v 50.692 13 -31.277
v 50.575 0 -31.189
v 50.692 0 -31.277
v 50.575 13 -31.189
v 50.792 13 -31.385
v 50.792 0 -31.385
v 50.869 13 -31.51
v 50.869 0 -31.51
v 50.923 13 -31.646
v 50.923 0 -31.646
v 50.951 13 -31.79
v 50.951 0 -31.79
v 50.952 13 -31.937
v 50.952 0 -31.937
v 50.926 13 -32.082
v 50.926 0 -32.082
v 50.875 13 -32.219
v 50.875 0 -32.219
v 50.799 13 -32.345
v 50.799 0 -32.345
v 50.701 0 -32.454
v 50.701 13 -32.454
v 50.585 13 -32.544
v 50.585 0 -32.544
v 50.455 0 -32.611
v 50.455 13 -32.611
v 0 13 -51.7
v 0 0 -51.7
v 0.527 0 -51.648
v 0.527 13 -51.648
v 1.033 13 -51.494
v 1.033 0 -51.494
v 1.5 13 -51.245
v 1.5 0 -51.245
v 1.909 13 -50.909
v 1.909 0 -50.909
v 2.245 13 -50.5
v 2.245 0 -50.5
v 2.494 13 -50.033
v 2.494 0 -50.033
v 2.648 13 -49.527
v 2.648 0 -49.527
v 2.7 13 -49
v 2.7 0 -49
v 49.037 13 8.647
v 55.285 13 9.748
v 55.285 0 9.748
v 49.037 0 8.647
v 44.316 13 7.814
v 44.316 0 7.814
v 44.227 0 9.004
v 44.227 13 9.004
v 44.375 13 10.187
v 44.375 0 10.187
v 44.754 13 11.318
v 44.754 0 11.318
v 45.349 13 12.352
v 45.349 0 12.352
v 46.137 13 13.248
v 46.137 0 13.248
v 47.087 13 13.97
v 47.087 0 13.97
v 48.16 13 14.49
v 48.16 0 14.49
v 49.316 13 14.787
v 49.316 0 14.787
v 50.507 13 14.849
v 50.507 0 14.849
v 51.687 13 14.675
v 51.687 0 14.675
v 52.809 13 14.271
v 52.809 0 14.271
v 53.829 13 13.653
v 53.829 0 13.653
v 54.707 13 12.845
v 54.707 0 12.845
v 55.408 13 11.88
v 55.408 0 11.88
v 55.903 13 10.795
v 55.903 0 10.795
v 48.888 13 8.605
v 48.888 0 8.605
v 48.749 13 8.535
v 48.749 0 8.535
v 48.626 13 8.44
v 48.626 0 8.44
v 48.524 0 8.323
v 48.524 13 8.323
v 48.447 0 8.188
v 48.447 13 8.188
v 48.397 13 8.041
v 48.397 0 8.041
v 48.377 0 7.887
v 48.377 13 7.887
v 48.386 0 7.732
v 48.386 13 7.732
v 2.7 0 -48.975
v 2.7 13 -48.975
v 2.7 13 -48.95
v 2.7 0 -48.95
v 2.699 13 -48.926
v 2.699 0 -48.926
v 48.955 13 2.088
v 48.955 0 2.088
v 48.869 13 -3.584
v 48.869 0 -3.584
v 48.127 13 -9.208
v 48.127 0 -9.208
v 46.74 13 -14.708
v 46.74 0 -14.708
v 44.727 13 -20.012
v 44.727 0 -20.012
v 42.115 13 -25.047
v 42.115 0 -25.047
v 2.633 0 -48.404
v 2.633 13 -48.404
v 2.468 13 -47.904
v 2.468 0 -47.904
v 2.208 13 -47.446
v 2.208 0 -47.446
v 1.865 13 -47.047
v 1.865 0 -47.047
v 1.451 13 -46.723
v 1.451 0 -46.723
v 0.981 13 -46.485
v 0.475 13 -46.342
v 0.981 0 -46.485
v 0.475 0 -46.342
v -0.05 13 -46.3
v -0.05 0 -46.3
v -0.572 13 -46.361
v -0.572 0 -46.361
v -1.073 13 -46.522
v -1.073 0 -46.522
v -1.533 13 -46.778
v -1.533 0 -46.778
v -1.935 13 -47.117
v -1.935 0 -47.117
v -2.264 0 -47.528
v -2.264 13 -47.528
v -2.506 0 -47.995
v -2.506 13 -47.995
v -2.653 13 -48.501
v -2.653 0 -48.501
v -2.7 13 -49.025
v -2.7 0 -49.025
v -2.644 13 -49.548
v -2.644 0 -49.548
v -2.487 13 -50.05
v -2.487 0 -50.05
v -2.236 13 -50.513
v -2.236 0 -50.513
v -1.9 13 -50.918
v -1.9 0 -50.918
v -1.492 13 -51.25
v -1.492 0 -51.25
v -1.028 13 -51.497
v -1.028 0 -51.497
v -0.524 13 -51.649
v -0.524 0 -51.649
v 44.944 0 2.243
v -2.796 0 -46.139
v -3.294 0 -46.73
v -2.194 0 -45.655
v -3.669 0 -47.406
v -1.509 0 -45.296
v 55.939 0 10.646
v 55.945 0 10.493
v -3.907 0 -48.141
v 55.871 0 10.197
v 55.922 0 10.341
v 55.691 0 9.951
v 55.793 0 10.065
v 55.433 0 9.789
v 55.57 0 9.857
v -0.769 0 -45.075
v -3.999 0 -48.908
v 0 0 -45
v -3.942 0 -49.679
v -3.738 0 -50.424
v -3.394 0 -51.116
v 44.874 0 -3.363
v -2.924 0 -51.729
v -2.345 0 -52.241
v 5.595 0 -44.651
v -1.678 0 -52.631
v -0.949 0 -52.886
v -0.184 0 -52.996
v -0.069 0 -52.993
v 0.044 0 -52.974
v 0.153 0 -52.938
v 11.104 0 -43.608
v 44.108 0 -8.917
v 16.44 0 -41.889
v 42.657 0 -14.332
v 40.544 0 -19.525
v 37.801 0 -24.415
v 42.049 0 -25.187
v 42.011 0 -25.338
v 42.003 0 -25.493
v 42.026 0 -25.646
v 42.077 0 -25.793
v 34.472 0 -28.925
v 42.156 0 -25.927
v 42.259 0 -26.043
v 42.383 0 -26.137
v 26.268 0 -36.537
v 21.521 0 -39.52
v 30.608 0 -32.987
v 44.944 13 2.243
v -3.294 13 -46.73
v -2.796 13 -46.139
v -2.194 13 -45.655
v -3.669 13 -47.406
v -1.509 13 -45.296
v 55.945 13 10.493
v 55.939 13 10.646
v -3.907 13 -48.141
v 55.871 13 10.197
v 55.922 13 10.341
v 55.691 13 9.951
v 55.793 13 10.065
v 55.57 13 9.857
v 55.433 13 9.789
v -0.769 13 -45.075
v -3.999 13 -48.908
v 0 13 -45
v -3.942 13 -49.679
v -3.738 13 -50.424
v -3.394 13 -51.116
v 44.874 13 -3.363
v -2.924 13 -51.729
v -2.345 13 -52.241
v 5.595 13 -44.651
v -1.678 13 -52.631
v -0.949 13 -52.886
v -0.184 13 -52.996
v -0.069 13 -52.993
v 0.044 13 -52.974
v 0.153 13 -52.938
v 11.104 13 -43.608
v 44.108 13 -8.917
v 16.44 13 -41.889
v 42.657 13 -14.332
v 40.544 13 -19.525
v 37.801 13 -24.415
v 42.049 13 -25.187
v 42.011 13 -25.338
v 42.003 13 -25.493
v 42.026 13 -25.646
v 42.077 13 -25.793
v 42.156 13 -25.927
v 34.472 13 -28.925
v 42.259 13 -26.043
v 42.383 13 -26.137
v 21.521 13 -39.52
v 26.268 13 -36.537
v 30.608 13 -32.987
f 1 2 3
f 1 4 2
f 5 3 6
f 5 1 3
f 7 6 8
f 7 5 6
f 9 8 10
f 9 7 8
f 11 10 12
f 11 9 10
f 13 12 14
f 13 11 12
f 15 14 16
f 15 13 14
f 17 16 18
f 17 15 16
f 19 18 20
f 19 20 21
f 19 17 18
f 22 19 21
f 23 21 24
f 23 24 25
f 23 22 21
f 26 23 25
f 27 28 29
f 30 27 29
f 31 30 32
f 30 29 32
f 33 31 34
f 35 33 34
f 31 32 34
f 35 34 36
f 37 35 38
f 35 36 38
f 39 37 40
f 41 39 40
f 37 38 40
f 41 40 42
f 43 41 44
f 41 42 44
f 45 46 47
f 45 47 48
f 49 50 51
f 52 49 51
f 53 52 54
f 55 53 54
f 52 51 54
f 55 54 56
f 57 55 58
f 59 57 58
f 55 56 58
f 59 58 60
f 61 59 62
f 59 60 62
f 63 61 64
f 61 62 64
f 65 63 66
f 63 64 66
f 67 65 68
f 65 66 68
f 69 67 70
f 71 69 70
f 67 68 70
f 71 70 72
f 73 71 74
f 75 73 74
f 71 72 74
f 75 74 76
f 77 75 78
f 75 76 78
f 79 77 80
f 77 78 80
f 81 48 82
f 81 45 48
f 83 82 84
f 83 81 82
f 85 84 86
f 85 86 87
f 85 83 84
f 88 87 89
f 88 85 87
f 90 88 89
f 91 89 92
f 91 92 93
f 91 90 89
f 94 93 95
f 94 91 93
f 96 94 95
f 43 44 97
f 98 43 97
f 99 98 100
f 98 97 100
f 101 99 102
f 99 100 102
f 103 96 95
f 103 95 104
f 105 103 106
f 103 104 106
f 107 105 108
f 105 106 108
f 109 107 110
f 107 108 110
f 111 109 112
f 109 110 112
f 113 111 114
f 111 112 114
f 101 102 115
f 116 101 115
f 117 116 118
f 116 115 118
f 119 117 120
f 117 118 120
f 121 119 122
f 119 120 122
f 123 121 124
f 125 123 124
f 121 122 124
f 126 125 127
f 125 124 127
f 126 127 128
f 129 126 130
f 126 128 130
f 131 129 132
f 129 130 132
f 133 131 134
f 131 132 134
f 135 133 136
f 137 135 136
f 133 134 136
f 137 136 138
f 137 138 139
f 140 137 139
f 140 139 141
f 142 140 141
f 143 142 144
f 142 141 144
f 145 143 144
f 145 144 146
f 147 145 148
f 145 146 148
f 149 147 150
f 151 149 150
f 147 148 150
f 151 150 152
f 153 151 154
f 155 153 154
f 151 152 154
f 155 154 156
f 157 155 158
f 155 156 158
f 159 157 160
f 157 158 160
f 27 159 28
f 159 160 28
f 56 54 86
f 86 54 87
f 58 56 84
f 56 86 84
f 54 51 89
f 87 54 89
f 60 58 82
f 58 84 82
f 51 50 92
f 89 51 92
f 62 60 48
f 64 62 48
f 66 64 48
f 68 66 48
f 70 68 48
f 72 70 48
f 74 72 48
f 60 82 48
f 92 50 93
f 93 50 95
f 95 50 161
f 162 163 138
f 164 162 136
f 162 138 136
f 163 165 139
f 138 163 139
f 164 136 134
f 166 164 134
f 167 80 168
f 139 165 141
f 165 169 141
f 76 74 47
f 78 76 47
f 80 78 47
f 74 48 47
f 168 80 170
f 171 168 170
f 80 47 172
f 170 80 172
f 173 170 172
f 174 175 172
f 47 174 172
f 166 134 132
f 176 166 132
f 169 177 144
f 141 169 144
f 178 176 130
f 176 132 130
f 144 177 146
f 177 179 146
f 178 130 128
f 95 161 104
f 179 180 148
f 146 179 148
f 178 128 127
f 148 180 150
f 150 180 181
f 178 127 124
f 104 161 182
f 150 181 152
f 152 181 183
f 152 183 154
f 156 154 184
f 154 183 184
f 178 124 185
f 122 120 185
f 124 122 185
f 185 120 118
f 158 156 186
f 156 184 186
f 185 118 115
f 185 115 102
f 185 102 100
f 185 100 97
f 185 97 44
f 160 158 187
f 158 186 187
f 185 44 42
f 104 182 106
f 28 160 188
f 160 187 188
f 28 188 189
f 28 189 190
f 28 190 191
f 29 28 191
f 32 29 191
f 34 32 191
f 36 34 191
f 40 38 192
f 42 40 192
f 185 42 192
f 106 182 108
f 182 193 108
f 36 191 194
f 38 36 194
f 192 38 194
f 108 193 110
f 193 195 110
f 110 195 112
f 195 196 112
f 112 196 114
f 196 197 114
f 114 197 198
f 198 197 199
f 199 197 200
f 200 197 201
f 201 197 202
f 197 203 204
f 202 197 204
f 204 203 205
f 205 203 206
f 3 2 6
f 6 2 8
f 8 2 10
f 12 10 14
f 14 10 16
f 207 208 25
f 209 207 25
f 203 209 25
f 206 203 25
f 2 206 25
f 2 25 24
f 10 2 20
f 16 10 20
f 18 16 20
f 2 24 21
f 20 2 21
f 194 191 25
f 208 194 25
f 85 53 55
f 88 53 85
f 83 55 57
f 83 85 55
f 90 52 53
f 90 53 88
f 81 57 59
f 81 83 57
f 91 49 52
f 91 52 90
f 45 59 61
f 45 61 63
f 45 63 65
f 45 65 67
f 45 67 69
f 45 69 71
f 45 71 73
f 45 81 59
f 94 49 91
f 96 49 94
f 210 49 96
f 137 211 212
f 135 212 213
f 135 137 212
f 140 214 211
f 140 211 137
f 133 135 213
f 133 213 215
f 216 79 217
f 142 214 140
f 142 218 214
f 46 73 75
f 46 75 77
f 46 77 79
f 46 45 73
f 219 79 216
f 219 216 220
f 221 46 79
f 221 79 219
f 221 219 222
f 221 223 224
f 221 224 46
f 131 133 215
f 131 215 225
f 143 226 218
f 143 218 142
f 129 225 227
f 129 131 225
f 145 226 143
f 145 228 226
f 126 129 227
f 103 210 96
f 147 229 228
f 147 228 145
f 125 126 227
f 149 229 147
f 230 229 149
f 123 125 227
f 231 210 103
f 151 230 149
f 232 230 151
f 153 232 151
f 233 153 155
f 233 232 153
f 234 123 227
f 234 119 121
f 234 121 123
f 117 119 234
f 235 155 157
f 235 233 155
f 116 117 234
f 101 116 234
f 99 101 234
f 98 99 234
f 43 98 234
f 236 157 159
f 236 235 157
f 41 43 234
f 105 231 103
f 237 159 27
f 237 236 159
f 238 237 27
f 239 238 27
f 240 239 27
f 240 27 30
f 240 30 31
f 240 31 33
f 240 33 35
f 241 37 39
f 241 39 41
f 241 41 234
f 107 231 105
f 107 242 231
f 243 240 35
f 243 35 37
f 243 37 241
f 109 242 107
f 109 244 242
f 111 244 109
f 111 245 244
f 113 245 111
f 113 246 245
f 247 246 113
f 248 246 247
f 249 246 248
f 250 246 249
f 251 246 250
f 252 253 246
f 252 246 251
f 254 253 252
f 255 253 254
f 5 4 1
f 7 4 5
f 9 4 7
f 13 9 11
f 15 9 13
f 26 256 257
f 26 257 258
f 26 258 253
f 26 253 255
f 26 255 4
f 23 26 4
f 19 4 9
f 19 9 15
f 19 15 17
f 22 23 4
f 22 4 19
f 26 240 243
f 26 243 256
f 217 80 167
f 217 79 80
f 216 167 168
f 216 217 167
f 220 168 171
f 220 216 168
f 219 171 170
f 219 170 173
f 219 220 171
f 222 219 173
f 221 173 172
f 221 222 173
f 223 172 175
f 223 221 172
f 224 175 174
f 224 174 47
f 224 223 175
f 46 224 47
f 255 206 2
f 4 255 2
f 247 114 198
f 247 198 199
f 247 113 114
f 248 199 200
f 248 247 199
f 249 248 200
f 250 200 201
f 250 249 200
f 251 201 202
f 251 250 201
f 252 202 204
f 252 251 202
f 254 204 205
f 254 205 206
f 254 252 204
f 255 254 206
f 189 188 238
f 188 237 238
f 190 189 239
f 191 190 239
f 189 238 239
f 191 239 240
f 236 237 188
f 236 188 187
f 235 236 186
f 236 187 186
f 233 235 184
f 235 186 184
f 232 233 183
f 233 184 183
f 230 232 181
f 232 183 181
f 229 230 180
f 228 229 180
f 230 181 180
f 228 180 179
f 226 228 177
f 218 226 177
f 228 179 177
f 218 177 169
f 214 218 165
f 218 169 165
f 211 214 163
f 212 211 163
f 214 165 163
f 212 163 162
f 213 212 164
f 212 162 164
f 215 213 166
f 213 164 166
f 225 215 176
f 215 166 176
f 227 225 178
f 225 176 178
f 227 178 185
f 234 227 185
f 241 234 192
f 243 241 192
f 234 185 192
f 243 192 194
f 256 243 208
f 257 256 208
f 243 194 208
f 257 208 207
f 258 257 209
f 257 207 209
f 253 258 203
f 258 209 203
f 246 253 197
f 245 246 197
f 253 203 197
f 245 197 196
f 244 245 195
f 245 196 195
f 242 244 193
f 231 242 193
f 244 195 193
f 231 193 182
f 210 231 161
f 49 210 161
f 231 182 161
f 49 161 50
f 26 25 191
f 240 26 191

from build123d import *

# Parameters (mm, degrees)
BOSS_EXTRUDE1_DEPTH = 13
FILLET1_R           = 0.8


with BuildPart() as part:
    # Sketch1 → Boss-Extrude1 (new body)
    with BuildSketch(Plane(origin=(0, 0, 0), x_dir=(1, 0, 0), z_dir=(0, 1, 0))):
        with BuildLine():
            Line((0, 51.7), (0, 53))
            ThreePointArc((0, 53), (-4, 49), (0, 45))
            ThreePointArc((0, 45), (34.47199994, 28.925442436), (44.316348886, -7.814167995))
            ThreePointArc((44.316348886, -7.814167995), (49.183306338, -14.764903579), (56.134041922, -9.897946127))
            Line((56.134041922, -9.897946127), (48.255579898, -8.508760706))
            ThreePointArc((48.255579898, -8.508760706), (48.127142564, 9.207505018), (41.707047143, 25.720074234))
            ThreePointArc((41.707047143, 25.720074234), (25.051905135, 42.111780407), (2.698975076, 48.925612245))
            ThreePointArc((2.698975076, 48.925612245), (-1.935309657, 47.117295421), (0, 51.7))
        make_face()
        with BuildLine():
            Line((51.921017872, 32.018867925), (0, 53))
            Line((0, 53), (0, 51.7))
            ThreePointArc((0, 51.7), (1.909188309, 50.909188309), (2.7, 49))
            ThreePointArc((2.7, 49), (2.699743757, 48.962802592), (2.698975076, 48.925612245))
            ThreePointArc((2.698975076, 48.925612245), (25.051905135, 42.111780407), (41.707047143, 25.720074234))
            Line((41.707047143, 25.720074234), (51.921017872, 32.018867925))
        make_face()
    extrude(amount=BOSS_EXTRUDE1_DEPTH)

    # Fillet1
    fillet1_edges = [part.edges().sort_by_distance(p)[0] for p in [
        (0, 6.5, -53),
        (51.921017872, 6.5, -32.018867925),
        (41.707047143, 6.5, -25.720074234),
        (48.255579898, 6.5, 8.508760706),
        (56.134041922, 6.5, 9.897946127),
    ]]
    fillet(fillet1_edges, radius=FILLET1_R)


solid = part.part
